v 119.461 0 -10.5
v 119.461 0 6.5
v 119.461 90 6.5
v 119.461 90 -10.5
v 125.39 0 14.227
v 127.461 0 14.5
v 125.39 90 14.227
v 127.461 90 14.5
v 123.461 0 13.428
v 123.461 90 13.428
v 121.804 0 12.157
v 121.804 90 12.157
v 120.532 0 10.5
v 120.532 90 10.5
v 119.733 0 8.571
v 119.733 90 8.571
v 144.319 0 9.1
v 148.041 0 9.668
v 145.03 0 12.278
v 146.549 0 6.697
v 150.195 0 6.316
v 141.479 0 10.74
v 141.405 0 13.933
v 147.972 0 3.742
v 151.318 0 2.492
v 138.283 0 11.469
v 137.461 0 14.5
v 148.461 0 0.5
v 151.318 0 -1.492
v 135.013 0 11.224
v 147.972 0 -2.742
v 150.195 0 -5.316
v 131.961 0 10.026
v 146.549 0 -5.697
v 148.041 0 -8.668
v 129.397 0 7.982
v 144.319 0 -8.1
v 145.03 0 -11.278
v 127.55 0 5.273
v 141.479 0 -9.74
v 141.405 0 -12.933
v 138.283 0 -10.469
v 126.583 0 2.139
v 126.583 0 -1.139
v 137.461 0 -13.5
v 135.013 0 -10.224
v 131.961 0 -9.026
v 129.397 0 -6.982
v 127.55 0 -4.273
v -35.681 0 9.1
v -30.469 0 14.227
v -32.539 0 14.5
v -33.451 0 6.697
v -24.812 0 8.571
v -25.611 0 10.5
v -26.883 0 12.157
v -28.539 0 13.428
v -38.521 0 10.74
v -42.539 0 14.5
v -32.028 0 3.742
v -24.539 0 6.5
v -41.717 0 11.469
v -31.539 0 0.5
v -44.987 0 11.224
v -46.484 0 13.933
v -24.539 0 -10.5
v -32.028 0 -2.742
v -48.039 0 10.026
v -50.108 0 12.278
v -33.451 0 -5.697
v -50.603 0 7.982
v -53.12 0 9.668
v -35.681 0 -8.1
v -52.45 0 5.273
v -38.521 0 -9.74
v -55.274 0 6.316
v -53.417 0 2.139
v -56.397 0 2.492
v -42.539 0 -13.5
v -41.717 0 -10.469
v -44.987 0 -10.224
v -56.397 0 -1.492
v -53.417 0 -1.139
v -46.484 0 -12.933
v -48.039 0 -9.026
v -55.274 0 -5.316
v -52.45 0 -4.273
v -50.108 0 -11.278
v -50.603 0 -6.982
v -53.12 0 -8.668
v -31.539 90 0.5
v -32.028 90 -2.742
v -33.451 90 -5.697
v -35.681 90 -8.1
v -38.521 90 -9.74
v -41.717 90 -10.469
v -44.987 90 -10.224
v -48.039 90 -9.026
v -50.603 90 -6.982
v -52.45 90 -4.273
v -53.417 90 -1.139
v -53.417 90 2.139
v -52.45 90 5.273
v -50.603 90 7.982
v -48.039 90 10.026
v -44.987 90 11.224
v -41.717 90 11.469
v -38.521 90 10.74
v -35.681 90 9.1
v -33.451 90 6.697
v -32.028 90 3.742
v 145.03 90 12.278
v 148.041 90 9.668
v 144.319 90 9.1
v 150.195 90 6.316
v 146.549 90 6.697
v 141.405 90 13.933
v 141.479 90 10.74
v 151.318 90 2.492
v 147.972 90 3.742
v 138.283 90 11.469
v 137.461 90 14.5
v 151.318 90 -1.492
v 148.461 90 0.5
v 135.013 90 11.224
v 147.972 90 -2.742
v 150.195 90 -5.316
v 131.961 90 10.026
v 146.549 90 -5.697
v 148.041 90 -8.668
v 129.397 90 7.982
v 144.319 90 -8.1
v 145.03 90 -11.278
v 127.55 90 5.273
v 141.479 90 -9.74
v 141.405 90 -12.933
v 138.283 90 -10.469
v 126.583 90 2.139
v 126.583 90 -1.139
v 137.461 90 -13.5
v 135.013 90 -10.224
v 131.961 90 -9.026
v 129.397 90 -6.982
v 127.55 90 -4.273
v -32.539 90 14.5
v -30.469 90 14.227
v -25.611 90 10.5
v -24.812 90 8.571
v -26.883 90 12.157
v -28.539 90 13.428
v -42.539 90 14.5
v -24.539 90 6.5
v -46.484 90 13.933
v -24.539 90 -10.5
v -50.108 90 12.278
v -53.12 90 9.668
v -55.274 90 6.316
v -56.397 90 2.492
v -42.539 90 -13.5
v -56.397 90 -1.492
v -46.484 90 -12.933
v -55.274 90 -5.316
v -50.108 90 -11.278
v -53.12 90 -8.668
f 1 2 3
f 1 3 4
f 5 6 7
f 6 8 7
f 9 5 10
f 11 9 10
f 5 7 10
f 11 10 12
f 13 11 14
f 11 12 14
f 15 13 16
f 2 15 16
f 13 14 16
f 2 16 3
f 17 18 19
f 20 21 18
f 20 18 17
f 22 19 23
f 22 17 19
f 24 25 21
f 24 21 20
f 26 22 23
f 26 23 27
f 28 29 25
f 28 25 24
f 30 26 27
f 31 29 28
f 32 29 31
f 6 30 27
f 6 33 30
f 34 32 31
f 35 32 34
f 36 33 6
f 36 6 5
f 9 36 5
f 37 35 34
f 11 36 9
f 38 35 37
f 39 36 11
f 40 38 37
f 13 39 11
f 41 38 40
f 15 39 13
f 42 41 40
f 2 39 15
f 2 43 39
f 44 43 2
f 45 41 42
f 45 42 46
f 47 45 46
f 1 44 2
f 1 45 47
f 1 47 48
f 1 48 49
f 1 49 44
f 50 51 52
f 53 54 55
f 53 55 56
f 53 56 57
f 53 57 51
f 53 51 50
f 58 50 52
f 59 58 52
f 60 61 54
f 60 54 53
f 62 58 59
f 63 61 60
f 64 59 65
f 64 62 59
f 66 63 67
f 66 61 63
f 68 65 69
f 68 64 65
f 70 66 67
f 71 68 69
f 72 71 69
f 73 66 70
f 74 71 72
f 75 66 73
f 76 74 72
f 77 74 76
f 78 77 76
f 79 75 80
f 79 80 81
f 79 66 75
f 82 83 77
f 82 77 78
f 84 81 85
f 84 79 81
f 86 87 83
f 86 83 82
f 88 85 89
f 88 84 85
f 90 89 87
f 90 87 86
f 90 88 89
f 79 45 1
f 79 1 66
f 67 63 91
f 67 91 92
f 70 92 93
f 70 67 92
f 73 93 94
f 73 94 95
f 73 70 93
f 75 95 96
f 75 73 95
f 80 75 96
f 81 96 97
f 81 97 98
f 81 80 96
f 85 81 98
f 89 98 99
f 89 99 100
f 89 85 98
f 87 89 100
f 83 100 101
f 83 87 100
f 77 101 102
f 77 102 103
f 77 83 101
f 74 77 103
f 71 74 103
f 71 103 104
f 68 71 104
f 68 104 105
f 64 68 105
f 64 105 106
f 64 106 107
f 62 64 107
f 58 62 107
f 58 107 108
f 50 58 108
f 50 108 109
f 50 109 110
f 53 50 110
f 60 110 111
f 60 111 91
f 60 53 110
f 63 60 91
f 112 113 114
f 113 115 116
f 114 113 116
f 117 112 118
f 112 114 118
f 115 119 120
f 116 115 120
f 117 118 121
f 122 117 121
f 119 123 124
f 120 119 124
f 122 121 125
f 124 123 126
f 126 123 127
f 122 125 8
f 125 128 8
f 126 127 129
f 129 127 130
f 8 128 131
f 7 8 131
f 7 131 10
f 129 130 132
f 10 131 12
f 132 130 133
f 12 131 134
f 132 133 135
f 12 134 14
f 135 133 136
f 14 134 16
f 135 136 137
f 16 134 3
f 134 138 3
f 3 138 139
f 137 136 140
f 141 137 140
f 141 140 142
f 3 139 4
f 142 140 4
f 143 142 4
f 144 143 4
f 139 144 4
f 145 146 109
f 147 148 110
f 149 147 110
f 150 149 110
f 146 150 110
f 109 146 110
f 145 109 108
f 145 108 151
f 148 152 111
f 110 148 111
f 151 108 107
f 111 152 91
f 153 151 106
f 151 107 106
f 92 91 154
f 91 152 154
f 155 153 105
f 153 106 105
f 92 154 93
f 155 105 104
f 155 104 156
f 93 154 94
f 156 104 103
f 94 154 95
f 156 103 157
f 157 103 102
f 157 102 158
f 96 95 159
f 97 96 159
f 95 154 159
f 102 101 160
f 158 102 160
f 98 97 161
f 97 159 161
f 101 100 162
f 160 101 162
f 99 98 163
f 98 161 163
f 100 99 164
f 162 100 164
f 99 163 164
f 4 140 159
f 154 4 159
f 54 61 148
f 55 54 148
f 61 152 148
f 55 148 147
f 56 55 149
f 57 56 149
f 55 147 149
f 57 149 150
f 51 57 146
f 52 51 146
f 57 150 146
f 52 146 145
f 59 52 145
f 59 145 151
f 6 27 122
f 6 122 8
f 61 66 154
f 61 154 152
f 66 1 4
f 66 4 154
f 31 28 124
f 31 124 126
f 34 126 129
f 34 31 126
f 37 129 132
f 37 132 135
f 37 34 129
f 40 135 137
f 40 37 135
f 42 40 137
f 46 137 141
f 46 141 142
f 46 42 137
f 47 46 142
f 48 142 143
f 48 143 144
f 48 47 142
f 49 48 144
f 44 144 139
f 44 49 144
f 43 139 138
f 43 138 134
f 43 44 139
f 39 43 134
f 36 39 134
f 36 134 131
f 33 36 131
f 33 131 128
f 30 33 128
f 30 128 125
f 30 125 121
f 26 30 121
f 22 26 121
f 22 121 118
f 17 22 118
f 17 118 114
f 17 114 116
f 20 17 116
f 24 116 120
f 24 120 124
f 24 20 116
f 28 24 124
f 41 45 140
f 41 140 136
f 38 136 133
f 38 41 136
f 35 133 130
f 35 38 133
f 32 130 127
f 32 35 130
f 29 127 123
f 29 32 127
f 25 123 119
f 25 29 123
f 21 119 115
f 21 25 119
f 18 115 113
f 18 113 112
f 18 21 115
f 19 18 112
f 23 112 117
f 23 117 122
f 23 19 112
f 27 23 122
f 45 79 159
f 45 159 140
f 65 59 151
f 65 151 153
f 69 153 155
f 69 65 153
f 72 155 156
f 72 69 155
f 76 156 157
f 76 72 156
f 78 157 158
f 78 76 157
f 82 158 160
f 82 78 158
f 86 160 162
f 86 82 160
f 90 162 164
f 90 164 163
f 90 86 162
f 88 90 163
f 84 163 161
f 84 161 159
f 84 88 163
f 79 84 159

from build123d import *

# Parameters (mm, degrees)
SKETCH1_R           = 11
BOSS_EXTRUDE1_DEPTH = 90
FILLET1_R           = 8


with BuildPart() as part:
    # Sketch1 → Boss-Extrude1 (new body)
    with BuildSketch(Plane(origin=(0, 0, 0), x_dir=(1, 0, 0), z_dir=(0, 1, 0))):
        with BuildLine():
            Line((137.460581558, -14.5), (119.460581558, -14.5))
            Line((119.460581558, -14.5), (119.460581558, 10.5))
            Line((119.460581558, 10.5), (-24.539418442, 10.5))
            Line((-24.539418442, 10.5), (-24.539418442, -14.5))
            Line((-24.539418442, -14.5), (-42.539418442, -14.5))
            ThreePointArc((-42.539418442, -14.5), (-56.539418442, -0.5), (-42.539418442, 13.5))
            Line((-42.539418442, 13.5), (137.460581558, 13.5))
            ThreePointArc((137.460581558, 13.5), (151.460581558, -0.5), (137.460581558, -14.5))
        make_face()
        with Locations((-42.539418442, -0.5)):
            Circle(SKETCH1_R, mode=Mode.SUBTRACT)
        with Locations((137.460581558, -0.5)):
            Circle(SKETCH1_R, mode=Mode.SUBTRACT)
    extrude(amount=BOSS_EXTRUDE1_DEPTH)

    # Fillet1
    fillet1_edges = [part.edges().sort_by_distance(p)[0] for p in [
        (119.460581558, 45, 14.5),
        (-24.539418442, 45, 14.5),
    ]]
    fillet(fillet1_edges, radius=FILLET1_R)


solid = part.part
